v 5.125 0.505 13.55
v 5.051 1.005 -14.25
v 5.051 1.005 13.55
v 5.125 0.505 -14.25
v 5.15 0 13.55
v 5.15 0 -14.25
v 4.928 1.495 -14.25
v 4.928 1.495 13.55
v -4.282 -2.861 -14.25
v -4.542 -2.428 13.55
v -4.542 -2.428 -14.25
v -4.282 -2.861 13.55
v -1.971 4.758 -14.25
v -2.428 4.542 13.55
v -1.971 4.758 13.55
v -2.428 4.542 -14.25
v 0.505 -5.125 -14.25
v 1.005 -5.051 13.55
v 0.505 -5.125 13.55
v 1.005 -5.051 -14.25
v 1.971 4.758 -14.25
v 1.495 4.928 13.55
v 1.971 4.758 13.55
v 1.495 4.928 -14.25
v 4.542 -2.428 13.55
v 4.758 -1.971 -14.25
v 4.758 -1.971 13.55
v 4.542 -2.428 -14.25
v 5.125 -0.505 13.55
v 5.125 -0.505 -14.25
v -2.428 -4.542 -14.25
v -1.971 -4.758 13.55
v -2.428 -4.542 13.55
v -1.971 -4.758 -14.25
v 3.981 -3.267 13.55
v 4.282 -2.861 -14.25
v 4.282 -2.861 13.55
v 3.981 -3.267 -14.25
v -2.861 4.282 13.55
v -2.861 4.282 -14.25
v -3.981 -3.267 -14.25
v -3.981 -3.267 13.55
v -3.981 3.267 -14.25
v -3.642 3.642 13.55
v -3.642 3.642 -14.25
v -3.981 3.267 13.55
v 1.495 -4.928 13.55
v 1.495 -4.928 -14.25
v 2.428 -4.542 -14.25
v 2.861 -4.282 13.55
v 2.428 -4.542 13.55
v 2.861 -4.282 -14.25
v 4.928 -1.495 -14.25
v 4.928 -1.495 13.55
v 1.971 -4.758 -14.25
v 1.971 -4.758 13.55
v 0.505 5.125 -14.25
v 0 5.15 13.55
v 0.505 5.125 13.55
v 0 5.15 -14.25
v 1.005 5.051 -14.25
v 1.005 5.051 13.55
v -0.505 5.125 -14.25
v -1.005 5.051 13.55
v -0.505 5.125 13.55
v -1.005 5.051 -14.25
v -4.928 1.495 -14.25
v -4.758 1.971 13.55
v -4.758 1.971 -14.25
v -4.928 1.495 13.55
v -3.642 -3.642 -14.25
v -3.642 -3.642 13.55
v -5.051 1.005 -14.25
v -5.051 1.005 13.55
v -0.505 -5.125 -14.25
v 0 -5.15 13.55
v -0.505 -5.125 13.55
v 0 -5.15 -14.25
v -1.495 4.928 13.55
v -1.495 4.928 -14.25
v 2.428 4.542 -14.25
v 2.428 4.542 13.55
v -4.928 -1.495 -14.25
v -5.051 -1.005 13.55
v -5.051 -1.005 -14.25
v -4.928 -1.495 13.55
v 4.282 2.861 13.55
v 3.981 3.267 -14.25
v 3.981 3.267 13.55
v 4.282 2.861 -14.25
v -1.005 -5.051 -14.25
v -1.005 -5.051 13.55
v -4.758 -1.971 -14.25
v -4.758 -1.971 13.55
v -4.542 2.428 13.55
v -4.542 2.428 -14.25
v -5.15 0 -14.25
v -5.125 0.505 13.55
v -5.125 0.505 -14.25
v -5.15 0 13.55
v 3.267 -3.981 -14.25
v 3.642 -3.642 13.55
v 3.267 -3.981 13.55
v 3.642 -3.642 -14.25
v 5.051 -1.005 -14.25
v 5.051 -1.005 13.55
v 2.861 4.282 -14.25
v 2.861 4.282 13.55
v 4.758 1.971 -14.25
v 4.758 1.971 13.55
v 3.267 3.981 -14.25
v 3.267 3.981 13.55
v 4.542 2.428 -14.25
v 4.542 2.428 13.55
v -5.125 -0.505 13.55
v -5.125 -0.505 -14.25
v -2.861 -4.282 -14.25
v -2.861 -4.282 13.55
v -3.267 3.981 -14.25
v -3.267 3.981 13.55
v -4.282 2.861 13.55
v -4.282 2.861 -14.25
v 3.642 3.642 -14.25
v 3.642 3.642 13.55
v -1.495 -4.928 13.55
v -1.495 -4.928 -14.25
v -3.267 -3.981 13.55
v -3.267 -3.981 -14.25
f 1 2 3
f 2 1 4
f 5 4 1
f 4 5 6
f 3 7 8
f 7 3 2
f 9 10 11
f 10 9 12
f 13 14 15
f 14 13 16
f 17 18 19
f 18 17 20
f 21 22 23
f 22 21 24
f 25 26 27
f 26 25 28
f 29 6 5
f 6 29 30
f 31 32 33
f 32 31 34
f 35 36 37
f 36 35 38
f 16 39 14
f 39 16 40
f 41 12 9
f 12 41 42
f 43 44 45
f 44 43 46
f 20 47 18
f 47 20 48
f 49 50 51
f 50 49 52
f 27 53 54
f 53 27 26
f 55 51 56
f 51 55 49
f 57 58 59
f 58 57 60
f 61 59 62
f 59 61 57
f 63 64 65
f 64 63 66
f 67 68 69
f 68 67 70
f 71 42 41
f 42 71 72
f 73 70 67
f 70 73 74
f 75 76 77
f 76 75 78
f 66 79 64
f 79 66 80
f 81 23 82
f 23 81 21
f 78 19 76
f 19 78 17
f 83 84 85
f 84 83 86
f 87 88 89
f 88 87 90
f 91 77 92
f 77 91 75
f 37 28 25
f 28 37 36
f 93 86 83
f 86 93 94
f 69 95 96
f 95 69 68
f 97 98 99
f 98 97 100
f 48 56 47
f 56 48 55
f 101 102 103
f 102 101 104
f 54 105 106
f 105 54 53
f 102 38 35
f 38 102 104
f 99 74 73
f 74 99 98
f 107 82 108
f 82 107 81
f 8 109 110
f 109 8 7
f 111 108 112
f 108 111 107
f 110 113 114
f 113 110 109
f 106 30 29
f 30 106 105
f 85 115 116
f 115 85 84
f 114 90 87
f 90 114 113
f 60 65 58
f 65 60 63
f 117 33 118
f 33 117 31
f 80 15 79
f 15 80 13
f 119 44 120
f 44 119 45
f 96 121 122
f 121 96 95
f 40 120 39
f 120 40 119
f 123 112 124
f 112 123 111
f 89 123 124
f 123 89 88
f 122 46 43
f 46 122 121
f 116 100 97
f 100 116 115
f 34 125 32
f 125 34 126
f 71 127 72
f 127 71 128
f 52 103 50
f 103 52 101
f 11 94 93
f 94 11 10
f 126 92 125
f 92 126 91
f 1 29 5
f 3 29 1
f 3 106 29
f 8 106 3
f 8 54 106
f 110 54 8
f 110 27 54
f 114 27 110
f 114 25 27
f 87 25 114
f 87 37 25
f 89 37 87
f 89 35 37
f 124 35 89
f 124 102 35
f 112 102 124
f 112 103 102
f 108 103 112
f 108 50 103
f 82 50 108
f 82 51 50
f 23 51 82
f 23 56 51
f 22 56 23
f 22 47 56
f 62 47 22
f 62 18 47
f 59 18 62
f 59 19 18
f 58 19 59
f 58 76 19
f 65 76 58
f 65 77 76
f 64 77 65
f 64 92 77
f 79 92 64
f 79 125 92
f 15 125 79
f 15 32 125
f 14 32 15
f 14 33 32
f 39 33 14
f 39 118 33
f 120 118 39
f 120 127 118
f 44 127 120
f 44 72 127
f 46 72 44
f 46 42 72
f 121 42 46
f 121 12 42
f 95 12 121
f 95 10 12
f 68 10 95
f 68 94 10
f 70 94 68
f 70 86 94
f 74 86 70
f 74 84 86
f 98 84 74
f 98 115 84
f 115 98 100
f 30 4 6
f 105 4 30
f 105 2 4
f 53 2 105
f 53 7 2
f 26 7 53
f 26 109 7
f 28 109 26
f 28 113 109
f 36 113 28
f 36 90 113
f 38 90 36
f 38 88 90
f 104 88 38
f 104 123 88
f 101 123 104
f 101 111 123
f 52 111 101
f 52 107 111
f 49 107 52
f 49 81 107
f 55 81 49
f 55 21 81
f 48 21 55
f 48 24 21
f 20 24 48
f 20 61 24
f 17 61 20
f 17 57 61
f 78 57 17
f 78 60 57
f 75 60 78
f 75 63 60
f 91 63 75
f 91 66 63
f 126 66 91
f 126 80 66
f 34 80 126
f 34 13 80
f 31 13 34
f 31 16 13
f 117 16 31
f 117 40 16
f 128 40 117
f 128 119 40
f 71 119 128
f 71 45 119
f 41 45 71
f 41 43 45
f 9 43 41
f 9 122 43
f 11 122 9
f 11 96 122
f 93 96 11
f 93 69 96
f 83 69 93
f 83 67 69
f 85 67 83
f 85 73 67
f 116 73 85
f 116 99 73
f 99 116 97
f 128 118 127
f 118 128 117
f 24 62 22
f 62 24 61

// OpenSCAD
// Parameters
overall_height_mm = 28.5; //[14.25:57:0.1]
outer_diameter_mm = 10.3; //[5.15:20.6:0.1]
body_height_mm = 27.8; //[13.9:55.6:0.1]
positive_terminal_height_mm = 0.7; //[0.35:1.4:0.05]
positive_terminal_diameter_mm = 4.5; //[2.25:9:0.1]
negative_terminal_height_mm = 0; //[0:1:0.05]
connection_overlap_mm = 0.8; //[0.5:2:0.1]

// Battery - complete geometry
module battery() {
  union() {
    // Cylindrical cell body
    color("Silver") {
      translate([0, 0, -(overall_height_mm/2) + (body_height_mm/2)])
        cylinder(h=body_height_mm, r=outer_diameter_mm/2, center=true, $fn=64);
    }
    
    // Positive terminal button
    color("Gold") {
      translate([0, 0, (overall_height_mm/2) - (positive_terminal_height_mm/2) - connection_overlap_mm])
        cylinder(h=positive_terminal_height_mm, r=positive_terminal_diameter_mm/2, center=true, $fn=64);
    }
    
    // Negative terminal flat end
    color("Silver") {
      translate([0, 0, -(overall_height_mm/2) + (connection_overlap_mm/2)])
        cylinder(h=connection_overlap_mm, r=outer_diameter_mm/2, center=true, $fn=64);
    }
  }
}

// Assembly
module assembly() {
  battery();
}

assembly();
